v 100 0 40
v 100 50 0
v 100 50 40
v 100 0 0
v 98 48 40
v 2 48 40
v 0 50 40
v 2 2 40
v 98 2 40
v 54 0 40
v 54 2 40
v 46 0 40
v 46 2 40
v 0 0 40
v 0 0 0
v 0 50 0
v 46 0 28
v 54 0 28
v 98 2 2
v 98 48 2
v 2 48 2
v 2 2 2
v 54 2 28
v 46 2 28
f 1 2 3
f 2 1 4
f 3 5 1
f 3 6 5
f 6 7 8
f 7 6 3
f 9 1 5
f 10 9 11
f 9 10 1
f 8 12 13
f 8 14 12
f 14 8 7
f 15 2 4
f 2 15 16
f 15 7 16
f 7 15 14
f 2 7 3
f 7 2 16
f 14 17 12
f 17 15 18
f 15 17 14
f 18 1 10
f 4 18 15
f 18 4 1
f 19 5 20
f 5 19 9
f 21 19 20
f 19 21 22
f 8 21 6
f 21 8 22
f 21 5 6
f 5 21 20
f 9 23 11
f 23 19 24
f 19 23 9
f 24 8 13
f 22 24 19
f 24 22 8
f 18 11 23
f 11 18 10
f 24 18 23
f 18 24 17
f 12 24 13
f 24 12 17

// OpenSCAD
$fn = 32;

// ----------------------------------------------------------------------
// Enclosure box: notch enclosure
// ----------------------------------------------------------------------

// --- parameters (mm) ---
box_l = 100;              // outer length, X
box_w = 50;               // outer width, Y
box_h = 40;               // outer height
wall_t = 2;               // wall thickness
notch_w = 8;              // cable notch width
notch_h = 12;             // cable notch height

inner_h = box_h - wall_t;  // cavity depth
boss_h = inner_h - 2;  // corner boss height

difference() {
  union() {
    difference() {
      cube([box_l, box_w, box_h]);
      translate([wall_t, wall_t, wall_t])
        cube([box_l - 2 * wall_t, box_w - 2 * wall_t, box_h]);
    }
  }
  translate([box_l / 2 - notch_w / 2, -1, box_h - notch_h])
    cube([notch_w, wall_t + 2, notch_h + 1]);
}
